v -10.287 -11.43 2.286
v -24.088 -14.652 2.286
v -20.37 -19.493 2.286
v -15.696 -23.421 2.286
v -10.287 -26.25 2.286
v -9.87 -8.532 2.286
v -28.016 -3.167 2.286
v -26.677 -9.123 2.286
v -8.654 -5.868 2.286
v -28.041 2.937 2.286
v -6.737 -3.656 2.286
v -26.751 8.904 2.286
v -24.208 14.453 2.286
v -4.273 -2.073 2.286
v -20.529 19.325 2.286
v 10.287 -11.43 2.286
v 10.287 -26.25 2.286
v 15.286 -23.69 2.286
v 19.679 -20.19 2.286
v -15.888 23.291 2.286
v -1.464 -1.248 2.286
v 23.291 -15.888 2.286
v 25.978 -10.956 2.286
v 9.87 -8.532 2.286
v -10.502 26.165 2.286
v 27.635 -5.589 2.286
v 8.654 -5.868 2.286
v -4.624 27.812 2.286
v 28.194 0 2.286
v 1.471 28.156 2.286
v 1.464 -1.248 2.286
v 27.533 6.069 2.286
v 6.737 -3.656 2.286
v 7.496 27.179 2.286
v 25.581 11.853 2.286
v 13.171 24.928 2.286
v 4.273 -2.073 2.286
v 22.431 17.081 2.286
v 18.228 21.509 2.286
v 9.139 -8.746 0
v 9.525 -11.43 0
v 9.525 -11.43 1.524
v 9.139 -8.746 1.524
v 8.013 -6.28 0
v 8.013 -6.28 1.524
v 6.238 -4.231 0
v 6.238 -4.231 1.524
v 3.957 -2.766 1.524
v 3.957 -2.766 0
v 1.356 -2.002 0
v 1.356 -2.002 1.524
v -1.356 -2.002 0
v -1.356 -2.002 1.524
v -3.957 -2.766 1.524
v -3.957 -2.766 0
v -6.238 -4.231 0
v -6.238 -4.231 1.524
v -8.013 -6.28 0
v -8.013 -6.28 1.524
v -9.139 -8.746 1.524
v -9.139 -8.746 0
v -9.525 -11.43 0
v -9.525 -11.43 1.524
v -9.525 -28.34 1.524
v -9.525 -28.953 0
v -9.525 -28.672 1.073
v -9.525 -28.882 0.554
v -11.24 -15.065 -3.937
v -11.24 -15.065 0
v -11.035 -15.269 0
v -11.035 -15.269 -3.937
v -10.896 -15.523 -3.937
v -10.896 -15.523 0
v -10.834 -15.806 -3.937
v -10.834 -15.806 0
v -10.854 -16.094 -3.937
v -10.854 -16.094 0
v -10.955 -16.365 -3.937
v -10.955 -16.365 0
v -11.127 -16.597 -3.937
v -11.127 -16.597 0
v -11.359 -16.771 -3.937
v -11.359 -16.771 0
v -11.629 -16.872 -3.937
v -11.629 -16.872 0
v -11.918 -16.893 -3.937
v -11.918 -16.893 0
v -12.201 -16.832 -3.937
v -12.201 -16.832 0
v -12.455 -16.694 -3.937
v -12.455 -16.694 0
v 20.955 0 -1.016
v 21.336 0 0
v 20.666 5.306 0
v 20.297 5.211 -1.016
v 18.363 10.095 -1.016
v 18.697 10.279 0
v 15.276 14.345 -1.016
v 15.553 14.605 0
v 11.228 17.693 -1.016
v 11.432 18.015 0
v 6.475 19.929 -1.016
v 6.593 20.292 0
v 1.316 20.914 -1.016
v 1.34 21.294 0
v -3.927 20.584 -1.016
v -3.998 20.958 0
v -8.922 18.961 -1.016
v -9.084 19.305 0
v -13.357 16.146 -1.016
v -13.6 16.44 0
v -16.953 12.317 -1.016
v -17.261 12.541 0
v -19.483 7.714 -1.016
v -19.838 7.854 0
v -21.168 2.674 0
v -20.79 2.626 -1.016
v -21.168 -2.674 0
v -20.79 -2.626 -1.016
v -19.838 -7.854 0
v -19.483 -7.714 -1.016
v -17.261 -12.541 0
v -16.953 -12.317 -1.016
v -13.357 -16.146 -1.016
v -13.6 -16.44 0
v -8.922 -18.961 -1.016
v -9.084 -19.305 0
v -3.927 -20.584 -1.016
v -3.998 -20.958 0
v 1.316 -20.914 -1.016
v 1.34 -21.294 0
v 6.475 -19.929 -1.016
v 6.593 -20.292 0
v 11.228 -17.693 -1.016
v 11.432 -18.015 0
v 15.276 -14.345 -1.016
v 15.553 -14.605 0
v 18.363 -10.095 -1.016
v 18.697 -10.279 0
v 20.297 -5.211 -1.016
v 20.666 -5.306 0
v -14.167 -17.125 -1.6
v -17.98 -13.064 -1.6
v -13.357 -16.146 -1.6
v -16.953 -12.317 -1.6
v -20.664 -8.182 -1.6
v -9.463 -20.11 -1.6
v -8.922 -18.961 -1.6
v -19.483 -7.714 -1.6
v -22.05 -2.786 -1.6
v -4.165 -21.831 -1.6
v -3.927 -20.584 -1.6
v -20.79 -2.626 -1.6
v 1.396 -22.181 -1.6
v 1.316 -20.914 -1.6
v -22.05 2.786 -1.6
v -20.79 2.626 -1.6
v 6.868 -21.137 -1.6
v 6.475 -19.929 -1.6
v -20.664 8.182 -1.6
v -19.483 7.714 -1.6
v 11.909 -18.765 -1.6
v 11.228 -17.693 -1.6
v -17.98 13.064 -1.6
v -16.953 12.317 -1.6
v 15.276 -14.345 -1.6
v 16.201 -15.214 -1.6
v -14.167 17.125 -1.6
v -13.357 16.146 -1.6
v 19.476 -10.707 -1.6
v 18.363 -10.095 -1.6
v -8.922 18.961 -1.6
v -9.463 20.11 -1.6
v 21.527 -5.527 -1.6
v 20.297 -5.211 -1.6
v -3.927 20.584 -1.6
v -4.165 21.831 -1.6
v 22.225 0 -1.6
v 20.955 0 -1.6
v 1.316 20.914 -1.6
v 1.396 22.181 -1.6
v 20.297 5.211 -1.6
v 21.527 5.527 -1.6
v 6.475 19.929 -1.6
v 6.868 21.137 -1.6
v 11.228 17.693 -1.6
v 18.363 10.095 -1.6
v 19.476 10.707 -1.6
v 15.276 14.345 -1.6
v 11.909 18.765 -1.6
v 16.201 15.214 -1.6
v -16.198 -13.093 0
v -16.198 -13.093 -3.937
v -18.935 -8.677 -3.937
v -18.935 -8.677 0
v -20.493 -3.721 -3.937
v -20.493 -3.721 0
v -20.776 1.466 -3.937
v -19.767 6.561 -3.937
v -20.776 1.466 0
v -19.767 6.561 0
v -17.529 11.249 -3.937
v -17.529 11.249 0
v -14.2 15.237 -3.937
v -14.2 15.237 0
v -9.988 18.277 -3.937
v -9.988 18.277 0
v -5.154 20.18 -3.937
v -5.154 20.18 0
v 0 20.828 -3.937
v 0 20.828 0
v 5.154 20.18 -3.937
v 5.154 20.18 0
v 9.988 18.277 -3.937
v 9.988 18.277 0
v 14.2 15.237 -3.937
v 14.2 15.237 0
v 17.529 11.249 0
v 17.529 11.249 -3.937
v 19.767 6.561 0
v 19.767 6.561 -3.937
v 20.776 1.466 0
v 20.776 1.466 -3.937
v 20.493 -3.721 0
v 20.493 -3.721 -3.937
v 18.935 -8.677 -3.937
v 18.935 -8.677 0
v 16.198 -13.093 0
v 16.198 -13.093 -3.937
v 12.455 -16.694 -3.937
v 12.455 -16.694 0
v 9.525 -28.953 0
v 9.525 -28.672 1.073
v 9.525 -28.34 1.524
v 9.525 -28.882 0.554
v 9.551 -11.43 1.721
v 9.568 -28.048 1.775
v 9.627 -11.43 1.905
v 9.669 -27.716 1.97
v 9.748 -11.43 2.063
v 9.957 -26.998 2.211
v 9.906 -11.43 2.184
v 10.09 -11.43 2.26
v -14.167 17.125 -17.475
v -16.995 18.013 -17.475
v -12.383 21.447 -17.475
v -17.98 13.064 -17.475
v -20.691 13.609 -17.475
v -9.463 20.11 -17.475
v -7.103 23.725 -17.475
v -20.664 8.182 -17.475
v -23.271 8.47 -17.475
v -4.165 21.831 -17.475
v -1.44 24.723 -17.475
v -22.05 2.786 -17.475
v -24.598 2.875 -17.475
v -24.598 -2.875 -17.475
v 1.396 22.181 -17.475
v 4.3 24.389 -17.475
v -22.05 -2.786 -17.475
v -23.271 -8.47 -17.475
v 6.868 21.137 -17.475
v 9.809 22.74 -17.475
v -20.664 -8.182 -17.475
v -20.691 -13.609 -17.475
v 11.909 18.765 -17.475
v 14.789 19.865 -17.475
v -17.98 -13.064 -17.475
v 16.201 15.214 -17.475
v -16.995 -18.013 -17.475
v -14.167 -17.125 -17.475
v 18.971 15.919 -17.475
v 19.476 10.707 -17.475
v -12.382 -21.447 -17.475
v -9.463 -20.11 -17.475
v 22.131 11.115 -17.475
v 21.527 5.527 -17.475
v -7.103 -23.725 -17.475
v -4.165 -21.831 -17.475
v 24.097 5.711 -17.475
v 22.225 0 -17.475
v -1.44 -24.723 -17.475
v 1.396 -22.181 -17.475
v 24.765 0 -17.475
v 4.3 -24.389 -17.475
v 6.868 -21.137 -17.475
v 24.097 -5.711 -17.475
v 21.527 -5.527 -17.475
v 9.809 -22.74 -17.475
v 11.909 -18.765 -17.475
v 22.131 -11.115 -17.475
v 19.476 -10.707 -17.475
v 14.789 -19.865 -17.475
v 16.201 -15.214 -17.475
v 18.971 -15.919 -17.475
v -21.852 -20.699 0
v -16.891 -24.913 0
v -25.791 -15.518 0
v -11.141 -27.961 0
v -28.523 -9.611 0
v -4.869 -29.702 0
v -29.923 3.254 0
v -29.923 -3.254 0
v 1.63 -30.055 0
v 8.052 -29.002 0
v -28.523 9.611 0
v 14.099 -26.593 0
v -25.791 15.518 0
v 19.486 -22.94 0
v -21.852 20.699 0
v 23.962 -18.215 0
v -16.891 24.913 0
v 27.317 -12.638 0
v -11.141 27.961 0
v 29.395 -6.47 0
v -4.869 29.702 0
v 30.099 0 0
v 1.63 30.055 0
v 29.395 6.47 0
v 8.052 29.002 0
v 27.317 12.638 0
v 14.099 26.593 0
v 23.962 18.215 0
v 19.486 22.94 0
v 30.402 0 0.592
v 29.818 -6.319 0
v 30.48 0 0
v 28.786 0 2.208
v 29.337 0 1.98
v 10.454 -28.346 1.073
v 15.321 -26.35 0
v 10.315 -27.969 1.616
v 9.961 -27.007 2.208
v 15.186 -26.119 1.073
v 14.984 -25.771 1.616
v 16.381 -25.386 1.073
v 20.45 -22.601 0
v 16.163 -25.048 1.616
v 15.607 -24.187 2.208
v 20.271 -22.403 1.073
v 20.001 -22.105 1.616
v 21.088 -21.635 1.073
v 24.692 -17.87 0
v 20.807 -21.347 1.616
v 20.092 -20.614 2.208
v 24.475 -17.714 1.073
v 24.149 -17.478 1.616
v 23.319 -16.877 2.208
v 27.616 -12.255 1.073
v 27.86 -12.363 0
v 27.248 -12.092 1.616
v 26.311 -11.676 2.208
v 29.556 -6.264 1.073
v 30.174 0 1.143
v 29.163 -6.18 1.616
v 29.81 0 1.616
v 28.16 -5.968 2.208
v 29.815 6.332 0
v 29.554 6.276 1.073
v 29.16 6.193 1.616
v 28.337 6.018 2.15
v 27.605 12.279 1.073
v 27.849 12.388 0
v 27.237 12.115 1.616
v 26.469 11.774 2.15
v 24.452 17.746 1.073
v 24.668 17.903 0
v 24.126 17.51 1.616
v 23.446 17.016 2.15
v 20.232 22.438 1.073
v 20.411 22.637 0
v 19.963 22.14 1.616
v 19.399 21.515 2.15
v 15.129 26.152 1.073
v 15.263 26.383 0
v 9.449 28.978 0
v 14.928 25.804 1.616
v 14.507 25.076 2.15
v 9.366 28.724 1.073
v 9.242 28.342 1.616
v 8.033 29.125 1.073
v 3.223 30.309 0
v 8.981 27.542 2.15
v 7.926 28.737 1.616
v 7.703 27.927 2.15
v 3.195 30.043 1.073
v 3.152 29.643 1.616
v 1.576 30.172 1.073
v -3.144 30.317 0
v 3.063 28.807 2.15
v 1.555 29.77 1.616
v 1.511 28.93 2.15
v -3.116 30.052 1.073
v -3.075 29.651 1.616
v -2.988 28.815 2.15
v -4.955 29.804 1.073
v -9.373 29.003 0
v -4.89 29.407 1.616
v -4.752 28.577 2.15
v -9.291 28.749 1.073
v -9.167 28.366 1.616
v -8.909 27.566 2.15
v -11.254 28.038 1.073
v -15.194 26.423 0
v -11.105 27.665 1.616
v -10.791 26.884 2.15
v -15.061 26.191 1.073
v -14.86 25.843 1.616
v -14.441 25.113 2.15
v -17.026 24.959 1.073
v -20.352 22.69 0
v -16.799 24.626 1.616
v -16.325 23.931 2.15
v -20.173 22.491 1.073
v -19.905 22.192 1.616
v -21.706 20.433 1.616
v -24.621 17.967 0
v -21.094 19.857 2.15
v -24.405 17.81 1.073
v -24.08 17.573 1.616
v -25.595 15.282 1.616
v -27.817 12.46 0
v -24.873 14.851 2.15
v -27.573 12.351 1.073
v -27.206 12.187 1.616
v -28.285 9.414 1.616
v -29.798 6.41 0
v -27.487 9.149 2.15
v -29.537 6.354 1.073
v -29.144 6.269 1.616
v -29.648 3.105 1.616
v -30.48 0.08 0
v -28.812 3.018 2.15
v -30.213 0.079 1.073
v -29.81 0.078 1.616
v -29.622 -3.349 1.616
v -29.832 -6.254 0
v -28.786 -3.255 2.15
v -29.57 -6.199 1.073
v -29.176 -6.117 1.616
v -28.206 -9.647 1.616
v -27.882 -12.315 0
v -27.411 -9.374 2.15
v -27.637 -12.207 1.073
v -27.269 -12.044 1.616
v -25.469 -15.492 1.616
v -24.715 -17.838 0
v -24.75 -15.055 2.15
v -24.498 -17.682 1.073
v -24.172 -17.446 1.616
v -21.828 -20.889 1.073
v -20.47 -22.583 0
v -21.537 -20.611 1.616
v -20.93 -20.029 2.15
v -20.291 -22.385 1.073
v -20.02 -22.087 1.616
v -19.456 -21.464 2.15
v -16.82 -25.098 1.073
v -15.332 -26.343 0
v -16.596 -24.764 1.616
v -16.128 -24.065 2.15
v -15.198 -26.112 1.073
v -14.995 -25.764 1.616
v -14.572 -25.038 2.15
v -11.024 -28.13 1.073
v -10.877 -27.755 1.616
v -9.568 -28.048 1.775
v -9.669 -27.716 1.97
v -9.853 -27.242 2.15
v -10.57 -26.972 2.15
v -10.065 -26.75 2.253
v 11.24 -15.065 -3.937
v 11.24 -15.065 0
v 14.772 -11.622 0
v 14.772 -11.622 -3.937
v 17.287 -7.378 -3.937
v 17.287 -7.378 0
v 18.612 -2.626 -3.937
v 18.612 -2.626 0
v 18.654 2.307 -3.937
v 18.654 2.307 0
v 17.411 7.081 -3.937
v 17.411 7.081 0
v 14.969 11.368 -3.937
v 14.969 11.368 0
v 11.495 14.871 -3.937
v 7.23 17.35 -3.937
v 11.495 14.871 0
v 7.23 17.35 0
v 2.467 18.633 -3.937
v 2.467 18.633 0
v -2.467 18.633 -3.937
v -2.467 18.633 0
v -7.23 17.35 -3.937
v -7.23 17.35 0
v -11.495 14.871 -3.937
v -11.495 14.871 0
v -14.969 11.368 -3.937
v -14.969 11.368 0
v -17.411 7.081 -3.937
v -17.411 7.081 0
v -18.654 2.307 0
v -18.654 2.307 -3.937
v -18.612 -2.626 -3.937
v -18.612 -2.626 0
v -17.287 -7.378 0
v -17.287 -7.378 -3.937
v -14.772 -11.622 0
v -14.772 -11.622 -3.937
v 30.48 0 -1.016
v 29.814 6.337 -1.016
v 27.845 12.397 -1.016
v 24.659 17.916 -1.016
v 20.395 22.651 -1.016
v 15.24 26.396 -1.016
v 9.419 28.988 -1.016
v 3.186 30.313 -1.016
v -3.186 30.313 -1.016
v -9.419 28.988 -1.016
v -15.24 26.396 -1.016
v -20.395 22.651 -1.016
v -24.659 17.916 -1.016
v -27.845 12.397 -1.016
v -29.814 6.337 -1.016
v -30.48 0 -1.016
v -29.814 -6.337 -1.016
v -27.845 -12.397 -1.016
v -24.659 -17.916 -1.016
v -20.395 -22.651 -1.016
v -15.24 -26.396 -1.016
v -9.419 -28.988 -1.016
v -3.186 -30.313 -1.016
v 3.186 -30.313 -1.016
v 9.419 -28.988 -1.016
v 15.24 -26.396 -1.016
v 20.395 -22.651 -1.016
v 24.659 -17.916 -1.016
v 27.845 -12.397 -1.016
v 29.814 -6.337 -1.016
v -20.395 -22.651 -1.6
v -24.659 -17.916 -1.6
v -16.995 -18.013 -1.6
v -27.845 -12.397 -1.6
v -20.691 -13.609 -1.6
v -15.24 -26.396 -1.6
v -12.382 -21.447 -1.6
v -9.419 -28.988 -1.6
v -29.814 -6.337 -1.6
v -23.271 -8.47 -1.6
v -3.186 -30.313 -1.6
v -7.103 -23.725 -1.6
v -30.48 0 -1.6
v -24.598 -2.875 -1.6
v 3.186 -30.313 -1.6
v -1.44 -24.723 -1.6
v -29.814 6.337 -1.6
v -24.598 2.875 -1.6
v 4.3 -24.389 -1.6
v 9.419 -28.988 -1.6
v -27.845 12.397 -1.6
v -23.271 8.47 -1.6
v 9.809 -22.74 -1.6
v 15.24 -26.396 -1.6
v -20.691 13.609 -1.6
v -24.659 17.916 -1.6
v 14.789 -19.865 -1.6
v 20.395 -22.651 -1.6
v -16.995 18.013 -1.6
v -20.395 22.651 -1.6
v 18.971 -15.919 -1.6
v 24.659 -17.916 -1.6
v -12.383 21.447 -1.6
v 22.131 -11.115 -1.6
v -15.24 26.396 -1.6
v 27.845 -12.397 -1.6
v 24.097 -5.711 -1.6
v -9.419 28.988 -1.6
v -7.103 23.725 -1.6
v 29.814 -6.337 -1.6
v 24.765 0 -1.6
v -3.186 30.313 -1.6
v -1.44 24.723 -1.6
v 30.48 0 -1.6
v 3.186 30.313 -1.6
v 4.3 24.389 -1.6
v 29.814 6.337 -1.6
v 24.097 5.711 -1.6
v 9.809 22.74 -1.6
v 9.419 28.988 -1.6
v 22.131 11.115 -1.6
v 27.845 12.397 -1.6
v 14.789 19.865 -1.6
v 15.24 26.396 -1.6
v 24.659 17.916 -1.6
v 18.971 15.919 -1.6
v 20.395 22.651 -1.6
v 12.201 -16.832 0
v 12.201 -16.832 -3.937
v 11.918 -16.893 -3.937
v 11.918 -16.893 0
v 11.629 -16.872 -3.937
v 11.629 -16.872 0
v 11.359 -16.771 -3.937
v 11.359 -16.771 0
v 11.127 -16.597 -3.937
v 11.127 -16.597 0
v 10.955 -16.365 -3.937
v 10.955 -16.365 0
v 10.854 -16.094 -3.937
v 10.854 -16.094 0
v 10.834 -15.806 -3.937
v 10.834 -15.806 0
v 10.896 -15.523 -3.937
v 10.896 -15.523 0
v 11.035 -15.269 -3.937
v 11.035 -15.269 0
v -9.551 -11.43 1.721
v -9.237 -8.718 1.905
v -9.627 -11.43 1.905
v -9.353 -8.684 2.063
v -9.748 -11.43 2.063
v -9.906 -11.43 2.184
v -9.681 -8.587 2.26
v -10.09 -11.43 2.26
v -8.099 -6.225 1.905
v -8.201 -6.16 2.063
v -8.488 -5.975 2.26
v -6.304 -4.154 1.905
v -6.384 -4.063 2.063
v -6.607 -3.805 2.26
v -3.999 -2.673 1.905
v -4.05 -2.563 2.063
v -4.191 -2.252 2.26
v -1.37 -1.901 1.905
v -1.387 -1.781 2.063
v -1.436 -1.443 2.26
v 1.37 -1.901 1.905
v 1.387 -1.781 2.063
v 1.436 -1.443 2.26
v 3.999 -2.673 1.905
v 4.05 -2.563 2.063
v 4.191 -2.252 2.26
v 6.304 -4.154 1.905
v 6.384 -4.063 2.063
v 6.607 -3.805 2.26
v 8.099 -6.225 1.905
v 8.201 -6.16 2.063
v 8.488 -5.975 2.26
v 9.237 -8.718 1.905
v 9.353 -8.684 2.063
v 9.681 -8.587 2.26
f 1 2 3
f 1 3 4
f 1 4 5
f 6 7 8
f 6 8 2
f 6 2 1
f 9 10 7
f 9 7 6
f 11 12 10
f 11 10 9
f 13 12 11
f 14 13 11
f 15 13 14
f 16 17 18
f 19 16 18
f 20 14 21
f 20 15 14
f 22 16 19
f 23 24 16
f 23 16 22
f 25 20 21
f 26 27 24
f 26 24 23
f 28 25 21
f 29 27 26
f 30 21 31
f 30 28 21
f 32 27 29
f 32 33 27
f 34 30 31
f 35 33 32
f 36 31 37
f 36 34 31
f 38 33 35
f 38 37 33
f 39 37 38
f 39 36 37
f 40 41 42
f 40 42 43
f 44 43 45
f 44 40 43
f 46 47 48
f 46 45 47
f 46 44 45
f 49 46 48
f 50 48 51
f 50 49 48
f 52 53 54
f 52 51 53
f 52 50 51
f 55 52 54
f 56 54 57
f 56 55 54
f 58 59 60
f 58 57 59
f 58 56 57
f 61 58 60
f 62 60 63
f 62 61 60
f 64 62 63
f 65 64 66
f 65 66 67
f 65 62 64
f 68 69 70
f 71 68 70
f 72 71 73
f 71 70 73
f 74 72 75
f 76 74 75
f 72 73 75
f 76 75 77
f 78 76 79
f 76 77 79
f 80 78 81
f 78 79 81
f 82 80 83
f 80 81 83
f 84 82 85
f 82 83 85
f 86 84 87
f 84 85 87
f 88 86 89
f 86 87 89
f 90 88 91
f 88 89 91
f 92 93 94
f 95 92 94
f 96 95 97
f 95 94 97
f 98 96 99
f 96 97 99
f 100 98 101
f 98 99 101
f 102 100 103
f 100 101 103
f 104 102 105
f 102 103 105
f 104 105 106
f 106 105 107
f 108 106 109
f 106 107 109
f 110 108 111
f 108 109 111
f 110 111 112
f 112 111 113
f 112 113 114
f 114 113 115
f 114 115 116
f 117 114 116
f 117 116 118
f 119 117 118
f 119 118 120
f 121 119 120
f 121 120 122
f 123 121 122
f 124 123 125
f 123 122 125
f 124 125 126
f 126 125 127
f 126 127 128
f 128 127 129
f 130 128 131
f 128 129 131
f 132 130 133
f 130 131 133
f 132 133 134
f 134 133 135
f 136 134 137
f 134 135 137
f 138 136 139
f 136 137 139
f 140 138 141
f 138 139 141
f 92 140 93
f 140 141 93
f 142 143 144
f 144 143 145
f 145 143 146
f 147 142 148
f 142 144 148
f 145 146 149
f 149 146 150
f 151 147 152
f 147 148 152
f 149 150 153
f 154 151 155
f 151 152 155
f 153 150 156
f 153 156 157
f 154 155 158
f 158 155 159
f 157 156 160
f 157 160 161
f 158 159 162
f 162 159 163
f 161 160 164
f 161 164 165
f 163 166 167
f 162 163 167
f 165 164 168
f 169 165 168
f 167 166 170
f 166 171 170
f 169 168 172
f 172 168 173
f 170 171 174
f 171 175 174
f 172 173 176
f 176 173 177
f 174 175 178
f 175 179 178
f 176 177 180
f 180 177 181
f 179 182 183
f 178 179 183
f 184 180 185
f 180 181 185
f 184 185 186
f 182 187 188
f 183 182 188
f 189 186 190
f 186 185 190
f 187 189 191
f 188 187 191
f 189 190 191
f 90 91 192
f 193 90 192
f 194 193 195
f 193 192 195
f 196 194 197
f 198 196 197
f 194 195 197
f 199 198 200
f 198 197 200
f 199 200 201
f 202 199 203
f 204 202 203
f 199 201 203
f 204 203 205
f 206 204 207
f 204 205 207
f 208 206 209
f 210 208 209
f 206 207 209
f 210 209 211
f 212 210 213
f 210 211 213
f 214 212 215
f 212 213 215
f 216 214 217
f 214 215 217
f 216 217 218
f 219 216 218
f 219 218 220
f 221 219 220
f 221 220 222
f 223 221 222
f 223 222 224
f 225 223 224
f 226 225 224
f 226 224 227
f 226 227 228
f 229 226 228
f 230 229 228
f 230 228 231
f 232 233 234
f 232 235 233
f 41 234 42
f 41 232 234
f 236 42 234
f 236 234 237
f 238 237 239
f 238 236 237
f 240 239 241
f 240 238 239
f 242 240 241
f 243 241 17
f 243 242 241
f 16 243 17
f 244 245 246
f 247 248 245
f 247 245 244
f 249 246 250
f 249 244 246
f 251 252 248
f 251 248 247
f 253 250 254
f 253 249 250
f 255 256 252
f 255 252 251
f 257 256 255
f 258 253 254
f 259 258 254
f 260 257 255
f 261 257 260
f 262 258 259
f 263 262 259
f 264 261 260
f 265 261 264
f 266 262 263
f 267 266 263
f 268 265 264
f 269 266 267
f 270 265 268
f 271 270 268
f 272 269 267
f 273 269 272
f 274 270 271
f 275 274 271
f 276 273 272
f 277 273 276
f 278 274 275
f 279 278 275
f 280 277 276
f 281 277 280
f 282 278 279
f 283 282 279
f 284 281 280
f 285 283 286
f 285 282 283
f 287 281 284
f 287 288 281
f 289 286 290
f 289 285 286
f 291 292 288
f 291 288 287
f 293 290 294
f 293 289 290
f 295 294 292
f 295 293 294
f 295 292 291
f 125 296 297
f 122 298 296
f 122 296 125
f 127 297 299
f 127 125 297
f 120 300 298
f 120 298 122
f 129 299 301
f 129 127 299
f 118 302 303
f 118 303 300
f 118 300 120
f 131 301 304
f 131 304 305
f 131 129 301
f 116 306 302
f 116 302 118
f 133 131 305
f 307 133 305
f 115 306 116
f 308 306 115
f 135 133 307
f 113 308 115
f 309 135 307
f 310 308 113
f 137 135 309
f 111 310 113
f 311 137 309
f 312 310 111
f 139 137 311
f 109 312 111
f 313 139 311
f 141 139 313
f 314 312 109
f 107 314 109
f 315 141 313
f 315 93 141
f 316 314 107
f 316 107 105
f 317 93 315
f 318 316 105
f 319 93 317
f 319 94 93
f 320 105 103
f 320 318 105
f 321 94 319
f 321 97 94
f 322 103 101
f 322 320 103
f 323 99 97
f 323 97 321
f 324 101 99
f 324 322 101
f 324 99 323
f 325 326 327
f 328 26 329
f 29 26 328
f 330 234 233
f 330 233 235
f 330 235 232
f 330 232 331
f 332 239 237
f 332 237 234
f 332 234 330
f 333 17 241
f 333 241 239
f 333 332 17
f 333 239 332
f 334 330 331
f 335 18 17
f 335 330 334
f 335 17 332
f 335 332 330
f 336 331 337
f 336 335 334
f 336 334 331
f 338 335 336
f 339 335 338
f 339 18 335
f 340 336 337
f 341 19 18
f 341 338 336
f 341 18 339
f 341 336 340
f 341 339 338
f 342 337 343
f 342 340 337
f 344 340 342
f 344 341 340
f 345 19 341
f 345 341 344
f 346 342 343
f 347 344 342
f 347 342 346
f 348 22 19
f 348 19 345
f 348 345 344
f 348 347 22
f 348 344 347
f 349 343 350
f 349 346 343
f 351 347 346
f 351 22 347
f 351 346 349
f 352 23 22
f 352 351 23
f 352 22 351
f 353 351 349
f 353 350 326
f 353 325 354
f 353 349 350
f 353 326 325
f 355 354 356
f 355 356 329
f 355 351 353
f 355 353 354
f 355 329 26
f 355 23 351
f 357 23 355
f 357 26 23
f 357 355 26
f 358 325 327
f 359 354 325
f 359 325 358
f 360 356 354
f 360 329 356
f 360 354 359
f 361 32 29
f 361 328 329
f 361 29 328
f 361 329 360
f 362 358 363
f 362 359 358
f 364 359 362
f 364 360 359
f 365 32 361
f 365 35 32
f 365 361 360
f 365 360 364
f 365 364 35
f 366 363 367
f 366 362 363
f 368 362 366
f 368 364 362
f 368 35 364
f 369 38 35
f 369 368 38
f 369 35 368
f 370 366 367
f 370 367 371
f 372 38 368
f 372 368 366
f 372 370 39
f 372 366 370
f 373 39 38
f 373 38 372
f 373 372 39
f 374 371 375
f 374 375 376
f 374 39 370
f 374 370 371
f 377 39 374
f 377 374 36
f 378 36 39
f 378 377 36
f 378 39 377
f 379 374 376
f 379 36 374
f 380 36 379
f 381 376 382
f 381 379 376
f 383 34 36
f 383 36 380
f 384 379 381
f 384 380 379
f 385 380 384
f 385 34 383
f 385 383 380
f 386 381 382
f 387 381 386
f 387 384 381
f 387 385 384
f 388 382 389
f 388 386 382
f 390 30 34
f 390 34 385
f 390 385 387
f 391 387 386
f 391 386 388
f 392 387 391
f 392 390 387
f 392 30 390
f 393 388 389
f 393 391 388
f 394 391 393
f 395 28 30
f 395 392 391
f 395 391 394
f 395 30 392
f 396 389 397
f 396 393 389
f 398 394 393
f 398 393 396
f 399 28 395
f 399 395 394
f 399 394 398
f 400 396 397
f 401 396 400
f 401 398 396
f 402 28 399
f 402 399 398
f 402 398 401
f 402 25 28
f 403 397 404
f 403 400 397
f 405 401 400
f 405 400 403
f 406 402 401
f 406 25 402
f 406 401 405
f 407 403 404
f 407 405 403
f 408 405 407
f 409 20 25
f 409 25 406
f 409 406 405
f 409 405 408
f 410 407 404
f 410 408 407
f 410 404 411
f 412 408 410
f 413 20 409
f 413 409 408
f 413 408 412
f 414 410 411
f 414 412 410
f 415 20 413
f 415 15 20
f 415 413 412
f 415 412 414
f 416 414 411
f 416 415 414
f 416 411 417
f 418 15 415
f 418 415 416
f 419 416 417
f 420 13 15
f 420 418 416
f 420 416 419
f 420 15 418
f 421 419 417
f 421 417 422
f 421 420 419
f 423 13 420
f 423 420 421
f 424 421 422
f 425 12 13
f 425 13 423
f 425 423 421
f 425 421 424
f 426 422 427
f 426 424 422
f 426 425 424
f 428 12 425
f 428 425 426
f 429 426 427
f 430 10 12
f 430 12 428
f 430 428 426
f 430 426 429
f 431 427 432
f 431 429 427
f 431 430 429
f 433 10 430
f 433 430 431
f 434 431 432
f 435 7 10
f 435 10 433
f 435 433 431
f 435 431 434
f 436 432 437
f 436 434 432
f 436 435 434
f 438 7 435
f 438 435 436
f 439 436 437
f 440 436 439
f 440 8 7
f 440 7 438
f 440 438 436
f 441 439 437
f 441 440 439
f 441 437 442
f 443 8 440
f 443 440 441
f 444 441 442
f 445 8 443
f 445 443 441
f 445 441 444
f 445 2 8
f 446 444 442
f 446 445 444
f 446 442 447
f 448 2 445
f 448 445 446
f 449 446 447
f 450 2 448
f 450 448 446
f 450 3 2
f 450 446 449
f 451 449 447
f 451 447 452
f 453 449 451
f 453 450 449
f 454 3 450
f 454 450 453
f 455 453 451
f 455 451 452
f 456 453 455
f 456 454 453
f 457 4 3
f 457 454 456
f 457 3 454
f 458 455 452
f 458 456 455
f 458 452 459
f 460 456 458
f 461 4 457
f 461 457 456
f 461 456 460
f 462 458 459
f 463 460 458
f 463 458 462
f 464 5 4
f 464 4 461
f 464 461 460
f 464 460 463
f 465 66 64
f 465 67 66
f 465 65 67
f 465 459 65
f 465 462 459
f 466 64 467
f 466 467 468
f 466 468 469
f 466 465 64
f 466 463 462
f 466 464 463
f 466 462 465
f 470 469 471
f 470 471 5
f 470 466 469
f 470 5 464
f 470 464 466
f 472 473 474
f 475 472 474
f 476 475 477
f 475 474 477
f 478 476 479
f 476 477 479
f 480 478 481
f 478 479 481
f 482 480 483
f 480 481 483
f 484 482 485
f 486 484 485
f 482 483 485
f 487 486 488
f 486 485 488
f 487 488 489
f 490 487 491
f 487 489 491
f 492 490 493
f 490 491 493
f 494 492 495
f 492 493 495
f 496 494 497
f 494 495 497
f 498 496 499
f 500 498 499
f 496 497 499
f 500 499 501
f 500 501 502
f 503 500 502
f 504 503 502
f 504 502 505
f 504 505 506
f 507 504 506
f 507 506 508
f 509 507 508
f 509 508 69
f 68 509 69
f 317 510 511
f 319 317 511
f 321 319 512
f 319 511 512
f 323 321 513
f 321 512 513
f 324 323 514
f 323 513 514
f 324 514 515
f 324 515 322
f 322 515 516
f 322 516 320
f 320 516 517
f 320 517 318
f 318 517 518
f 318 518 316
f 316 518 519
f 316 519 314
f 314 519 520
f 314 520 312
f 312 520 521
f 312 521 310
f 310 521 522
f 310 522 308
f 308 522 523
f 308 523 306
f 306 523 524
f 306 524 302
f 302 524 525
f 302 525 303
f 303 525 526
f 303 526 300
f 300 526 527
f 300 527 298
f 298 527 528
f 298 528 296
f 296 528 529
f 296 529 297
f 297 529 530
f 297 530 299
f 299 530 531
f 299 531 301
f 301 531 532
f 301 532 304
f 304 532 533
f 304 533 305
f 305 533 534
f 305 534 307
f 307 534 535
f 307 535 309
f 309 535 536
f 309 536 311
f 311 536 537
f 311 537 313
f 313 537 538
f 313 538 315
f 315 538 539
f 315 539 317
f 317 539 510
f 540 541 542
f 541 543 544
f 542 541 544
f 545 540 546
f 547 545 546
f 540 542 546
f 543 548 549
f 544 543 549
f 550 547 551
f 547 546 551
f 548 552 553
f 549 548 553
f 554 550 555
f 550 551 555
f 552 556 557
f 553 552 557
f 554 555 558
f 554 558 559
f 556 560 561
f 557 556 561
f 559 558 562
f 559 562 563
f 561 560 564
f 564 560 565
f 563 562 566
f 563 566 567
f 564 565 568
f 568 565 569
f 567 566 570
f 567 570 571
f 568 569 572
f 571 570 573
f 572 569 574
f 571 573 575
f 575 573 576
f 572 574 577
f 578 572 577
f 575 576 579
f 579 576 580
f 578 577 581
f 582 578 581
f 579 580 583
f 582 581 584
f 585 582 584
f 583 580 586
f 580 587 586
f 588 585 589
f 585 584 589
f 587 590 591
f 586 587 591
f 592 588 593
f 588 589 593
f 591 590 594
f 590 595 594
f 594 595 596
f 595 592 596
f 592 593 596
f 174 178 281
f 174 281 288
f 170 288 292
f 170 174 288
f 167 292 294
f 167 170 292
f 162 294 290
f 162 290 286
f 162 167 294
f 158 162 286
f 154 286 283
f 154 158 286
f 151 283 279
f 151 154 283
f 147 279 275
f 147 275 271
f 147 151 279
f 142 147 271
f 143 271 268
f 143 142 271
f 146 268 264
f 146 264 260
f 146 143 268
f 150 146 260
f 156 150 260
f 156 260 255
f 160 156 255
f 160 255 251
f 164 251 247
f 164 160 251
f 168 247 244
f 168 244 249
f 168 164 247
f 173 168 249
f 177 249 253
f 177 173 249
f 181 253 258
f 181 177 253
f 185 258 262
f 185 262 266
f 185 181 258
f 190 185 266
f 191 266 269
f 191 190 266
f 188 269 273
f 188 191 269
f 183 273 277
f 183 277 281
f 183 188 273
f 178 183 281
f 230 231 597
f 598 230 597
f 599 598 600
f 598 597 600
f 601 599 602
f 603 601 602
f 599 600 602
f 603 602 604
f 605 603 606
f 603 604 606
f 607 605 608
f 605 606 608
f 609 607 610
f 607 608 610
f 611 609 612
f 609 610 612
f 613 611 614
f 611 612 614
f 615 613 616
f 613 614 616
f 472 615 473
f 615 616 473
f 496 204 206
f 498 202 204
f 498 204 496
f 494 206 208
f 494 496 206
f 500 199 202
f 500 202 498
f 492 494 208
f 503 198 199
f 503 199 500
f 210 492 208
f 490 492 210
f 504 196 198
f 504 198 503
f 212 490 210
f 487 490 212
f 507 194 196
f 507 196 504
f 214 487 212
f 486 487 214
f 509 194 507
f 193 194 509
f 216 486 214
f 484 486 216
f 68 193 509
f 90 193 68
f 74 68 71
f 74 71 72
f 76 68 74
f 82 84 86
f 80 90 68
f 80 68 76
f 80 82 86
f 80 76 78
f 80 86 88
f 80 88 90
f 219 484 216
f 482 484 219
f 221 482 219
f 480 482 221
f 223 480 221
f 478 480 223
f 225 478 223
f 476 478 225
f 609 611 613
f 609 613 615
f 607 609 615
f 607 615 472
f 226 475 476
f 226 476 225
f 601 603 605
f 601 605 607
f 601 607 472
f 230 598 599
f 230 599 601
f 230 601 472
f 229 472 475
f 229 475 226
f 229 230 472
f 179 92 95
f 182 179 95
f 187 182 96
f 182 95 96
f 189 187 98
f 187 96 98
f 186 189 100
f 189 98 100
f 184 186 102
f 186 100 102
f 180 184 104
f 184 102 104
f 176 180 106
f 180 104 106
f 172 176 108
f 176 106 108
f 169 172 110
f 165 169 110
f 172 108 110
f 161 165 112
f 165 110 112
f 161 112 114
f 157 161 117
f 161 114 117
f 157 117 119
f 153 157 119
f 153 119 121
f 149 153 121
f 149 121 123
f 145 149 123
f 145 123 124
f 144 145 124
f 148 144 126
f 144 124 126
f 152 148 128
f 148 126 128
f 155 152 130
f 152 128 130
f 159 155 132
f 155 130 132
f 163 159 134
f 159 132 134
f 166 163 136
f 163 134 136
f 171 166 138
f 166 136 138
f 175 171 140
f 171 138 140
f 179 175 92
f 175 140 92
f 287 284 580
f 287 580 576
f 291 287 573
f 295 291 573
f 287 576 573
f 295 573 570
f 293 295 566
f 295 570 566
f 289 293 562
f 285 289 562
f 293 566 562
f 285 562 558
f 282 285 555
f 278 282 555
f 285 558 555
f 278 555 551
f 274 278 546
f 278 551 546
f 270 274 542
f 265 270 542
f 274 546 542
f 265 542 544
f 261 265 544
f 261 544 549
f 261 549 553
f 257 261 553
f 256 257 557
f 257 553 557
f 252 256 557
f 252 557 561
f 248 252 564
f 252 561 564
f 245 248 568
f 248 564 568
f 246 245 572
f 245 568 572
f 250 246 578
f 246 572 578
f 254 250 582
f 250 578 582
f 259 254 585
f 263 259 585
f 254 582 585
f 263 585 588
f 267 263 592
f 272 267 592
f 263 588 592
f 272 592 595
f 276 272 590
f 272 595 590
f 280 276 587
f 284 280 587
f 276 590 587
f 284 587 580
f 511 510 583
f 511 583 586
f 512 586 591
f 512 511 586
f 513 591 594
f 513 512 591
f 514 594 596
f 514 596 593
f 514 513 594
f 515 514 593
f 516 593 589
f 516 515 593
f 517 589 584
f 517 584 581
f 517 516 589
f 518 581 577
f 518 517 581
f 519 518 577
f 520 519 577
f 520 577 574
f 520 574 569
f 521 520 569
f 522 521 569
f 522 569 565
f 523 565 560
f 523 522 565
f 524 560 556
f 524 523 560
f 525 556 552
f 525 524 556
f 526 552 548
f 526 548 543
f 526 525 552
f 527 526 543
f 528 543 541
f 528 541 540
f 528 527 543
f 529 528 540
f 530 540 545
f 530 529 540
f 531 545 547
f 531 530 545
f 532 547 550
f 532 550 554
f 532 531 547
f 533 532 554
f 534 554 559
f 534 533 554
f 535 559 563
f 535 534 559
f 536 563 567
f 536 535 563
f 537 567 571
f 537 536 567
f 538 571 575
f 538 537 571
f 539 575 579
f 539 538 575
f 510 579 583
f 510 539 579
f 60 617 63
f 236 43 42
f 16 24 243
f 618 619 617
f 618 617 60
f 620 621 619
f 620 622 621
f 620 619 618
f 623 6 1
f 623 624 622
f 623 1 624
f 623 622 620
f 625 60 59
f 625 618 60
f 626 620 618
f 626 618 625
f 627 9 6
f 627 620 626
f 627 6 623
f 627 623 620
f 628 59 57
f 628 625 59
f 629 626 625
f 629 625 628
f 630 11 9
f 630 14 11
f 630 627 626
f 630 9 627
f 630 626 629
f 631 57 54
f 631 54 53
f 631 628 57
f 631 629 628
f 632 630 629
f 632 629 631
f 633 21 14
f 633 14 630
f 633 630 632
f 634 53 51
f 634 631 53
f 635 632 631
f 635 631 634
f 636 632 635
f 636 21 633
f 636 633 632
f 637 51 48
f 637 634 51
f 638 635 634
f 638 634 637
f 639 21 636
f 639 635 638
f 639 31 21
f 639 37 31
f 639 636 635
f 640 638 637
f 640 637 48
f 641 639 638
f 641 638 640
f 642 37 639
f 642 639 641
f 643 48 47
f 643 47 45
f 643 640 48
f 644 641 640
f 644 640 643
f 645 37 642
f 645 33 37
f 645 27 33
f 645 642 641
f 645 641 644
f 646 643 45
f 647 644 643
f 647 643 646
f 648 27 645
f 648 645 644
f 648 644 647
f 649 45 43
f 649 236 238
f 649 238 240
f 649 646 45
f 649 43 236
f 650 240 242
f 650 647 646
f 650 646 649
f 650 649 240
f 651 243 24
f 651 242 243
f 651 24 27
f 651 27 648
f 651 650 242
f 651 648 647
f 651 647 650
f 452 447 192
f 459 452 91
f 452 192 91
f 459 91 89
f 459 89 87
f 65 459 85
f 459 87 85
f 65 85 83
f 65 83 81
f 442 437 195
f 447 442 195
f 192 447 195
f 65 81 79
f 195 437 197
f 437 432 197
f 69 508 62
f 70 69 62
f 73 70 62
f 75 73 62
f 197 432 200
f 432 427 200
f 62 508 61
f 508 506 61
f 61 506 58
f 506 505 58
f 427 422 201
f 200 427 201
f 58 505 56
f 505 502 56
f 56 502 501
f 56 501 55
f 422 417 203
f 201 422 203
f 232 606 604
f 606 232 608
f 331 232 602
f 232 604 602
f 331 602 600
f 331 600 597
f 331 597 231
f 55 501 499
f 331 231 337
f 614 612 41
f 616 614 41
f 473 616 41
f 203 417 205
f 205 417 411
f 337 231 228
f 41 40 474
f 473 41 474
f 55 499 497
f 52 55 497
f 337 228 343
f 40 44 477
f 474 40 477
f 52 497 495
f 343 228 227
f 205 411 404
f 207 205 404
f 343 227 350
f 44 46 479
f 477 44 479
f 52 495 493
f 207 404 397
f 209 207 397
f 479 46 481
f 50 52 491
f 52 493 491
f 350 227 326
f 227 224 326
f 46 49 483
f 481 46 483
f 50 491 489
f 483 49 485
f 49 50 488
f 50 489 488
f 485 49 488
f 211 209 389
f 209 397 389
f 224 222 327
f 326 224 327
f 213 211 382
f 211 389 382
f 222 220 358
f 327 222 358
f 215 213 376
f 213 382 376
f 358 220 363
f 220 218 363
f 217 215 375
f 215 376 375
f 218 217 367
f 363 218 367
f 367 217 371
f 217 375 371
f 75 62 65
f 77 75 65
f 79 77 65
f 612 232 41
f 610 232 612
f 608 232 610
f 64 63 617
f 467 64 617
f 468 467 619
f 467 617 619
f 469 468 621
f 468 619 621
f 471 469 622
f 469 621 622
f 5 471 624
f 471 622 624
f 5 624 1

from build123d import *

# Parameters (mm, degrees)
F0_R        = 30.48
F0_R_2      = 20.955
F1_DEPTH    = 1.6002
F2_R        = 24.765
F2_R_2      = 22.225
F3_DEPTH    = 15.875
F5_DEPTH    = 2.286
F6_R        = 2.28599
F7_DEPTH    = 2.287
F8_T1_DEPTH = 17.0113255723
F8_T4_ANGLE = 180
F10_DEPTH   = 3.937
F11_SIZE2   = 1.016
F11_SIZE    = 0.381
F12_SIZE2   = 0.381
F12_SIZE    = 1.016


# Not quite as in the source:
# - a fillet or chamfer that OpenCascade refuses, or shapes differently, is made with other operations: its cross-section is extruded or revolved along the edge and cut away or added
# - a fillet or chamfer is up to 0.001 mm smaller than in the source, because OpenCascade refuses the exact size


with BuildPart() as f1:
    # F0 (on Top) → F1 (new body)
    with BuildSketch(Plane.XY):
        Circle(F0_R)
        Circle(F0_R_2, mode=Mode.SUBTRACT)
    extrude(amount=-F1_DEPTH)

    # F2 (on face) → F3 (join)
    with BuildSketch(Plane(origin=(0, 0, -1.6002), x_dir=(1, 0, 0), z_dir=(0, 0, -1))):
        Circle(F2_R)
        Circle(F2_R_2, mode=Mode.SUBTRACT)
    extrude(amount=F3_DEPTH)

    # F11
    f11_edges = [f1.edges().sort_by_distance(p)[0] for p in [
        (-30.48, 0, 0),
    ]]
    f11_side = f1.faces().sort_by_distance((-29.617895, 0, 0))[0]
    chamfer(f11_edges, length=F11_SIZE, length2=F11_SIZE2, reference=f11_side)

    # F12
    f12_edges = [f1.edges().sort_by_distance(p)[0] for p in [
        (-20.955, 0, 0),
    ]]
    f12_side = f1.faces().sort_by_distance((-20.955, 0, -0.8001))[0]
    chamfer(f12_edges, length=F12_SIZE, length2=F12_SIZE2, reference=f12_side)


with BuildPart() as f5:
    # F4 (on face) → F5 (new body)
    with BuildSketch(Plane.XY):
        with BuildLine():
            Line((-9.525, -18.66511184), (-9.525, -28.9534933126))
            ThreePointArc((-9.525, -28.9534933126), (0, -30.48), (9.525, -28.9534933126))
            Line((9.525, -28.9534933126), (9.525, -18.66511184))
            ThreePointArc((9.525, -18.66511184), (0, -20.955), (-9.525, -18.66511184))
        make_face()
        with BuildLine():
            ThreePointArc((9.525, -28.9534933126), (24.6916220609, -17.8704840449), (30.48, 0))
            ThreePointArc((30.48, 0), (-17.8704840449, 24.6916220609), (-9.525, -28.9534933126))
            Line((-9.525, -28.9534933126), (-9.525, -18.66511184))
            ThreePointArc((-9.525, -18.66511184), (-10.9433918417, 17.8704840449), (20.955, 0))
            ThreePointArc((20.955, 0), (17.8704840449, -10.9433918417), (9.525, -18.66511184))
            Line((9.525, -18.66511184), (9.525, -28.9534933126))
        make_face()
        with BuildLine():
            Line((-9.525, -11.43), (-9.525, -18.66511184))
            ThreePointArc((-9.525, -18.66511184), (0, -20.955), (9.525, -18.66511184))
            Line((9.525, -18.66511184), (9.525, -11.43))
            ThreePointArc((9.525, -11.43), (0, -1.905), (-9.525, -11.43))
        make_face()
        with BuildLine():
            ThreePointArc((20.955, 0), (-10.9433918417, 17.8704840449), (-9.525, -18.66511184))
            Line((-9.525, -18.66511184), (-9.525, -11.43))
            ThreePointArc((-9.525, -11.43), (0, -1.905), (9.525, -11.43))
            Line((9.525, -11.43), (9.525, -18.66511184))
            ThreePointArc((9.525, -18.66511184), (17.8704840449, -10.9433918417), (20.955, 0))
        make_face()
    extrude(amount=F5_DEPTH)

    # F6 (radius 2.286 in the source; OpenCascade refuses exactly that, so slightly less here)
    f6_edges = [f5.edges().sort_by_distance(p)[0] for p in [
        (-9.525, 28.953493, 2.286),
    ]]
    fillet(f6_edges, radius=F6_R)

    # F4 (on face) → F7 (cut, through all)
    with BuildSketch(Plane.XY):
        with BuildLine():
            Line((-9.525, -11.43), (-9.525, -18.66511184))
            ThreePointArc((-9.525, -18.66511184), (0, -20.955), (9.525, -18.66511184))
            Line((9.525, -18.66511184), (9.525, -11.43))
            ThreePointArc((9.525, -11.43), (0, -1.905), (-9.525, -11.43))
        make_face()
        with BuildLine():
            Line((-9.525, -18.66511184), (-9.525, -28.9534933126))
            ThreePointArc((-9.525, -28.9534933126), (0, -30.48), (9.525, -28.9534933126))
            Line((9.525, -28.9534933126), (9.525, -18.66511184))
            ThreePointArc((9.525, -18.66511184), (0, -20.955), (-9.525, -18.66511184))
        make_face()
    extrude(amount=F7_DEPTH, mode=Mode.SUBTRACT)

    # F8: fillet of radius 0.762 on 3 edges, made by hand

    # F8_s2 → F8_t1 (cut)
    with BuildSketch(Plane.XZ.offset(11.43)):
        with BuildLine():
            ThreePointArc((-9.525, 1.524), (-9.7481846327, 2.0628153673), (-10.287, 2.286))
            Line((-10.287, 2.286), (-9.525, 2.286))
            Line((-9.525, 2.286), (-9.525, 1.524))
        make_face()
        with BuildLine():
            ThreePointArc((9.525, 1.524), (9.7481846327, 2.0628153673), (10.287, 2.286))
            Line((10.287, 2.286), (9.525, 2.286))
            Line((9.525, 2.286), (9.525, 1.524))
        make_face()
    extrude(amount=F8_T1_DEPTH, mode=Mode.SUBTRACT)

    # F8_s3 → F8_t4 (revolve, cut)
    with BuildSketch(Plane.XZ.offset(11.43)):
        with BuildLine():
            ThreePointArc((-9.525, 1.524), (-9.7481846327, 2.0628153673), (-10.287, 2.286))
            Line((-10.287, 2.286), (-9.525, 2.286))
            Line((-9.525, 2.286), (-9.525, 1.524))
        make_face()
    revolve(axis=Axis((0, -11.43, 2.286), (0, 0, -1)), revolution_arc=F8_T4_ANGLE, mode=Mode.SUBTRACT)

    # F9 (on face) → F10 (join)
    with BuildSketch(Plane(origin=(0, 0, 0), x_dir=(1, 0, 0), z_dir=(0, 0, -1))):
        with BuildLine():
            ThreePointArc((-12.4545810811, 16.6939807744), (0, -20.828), (12.4545810811, 16.6939807744))
            ThreePointArc((12.4545810811, 16.6939807744), (11.032700015, 16.4871807893), (11.2395, 15.0652997232))
            ThreePointArc((11.2395, 15.0652997232), (0, -18.796), (-11.2395, 15.0652997232))
            ThreePointArc((-11.2395, 15.0652997232), (-11.032700015, 16.4871807893), (-12.4545810811, 16.6939807744))
        make_face()
    extrude(amount=F10_DEPTH)


solid = Compound([f1.part, f5.part])
